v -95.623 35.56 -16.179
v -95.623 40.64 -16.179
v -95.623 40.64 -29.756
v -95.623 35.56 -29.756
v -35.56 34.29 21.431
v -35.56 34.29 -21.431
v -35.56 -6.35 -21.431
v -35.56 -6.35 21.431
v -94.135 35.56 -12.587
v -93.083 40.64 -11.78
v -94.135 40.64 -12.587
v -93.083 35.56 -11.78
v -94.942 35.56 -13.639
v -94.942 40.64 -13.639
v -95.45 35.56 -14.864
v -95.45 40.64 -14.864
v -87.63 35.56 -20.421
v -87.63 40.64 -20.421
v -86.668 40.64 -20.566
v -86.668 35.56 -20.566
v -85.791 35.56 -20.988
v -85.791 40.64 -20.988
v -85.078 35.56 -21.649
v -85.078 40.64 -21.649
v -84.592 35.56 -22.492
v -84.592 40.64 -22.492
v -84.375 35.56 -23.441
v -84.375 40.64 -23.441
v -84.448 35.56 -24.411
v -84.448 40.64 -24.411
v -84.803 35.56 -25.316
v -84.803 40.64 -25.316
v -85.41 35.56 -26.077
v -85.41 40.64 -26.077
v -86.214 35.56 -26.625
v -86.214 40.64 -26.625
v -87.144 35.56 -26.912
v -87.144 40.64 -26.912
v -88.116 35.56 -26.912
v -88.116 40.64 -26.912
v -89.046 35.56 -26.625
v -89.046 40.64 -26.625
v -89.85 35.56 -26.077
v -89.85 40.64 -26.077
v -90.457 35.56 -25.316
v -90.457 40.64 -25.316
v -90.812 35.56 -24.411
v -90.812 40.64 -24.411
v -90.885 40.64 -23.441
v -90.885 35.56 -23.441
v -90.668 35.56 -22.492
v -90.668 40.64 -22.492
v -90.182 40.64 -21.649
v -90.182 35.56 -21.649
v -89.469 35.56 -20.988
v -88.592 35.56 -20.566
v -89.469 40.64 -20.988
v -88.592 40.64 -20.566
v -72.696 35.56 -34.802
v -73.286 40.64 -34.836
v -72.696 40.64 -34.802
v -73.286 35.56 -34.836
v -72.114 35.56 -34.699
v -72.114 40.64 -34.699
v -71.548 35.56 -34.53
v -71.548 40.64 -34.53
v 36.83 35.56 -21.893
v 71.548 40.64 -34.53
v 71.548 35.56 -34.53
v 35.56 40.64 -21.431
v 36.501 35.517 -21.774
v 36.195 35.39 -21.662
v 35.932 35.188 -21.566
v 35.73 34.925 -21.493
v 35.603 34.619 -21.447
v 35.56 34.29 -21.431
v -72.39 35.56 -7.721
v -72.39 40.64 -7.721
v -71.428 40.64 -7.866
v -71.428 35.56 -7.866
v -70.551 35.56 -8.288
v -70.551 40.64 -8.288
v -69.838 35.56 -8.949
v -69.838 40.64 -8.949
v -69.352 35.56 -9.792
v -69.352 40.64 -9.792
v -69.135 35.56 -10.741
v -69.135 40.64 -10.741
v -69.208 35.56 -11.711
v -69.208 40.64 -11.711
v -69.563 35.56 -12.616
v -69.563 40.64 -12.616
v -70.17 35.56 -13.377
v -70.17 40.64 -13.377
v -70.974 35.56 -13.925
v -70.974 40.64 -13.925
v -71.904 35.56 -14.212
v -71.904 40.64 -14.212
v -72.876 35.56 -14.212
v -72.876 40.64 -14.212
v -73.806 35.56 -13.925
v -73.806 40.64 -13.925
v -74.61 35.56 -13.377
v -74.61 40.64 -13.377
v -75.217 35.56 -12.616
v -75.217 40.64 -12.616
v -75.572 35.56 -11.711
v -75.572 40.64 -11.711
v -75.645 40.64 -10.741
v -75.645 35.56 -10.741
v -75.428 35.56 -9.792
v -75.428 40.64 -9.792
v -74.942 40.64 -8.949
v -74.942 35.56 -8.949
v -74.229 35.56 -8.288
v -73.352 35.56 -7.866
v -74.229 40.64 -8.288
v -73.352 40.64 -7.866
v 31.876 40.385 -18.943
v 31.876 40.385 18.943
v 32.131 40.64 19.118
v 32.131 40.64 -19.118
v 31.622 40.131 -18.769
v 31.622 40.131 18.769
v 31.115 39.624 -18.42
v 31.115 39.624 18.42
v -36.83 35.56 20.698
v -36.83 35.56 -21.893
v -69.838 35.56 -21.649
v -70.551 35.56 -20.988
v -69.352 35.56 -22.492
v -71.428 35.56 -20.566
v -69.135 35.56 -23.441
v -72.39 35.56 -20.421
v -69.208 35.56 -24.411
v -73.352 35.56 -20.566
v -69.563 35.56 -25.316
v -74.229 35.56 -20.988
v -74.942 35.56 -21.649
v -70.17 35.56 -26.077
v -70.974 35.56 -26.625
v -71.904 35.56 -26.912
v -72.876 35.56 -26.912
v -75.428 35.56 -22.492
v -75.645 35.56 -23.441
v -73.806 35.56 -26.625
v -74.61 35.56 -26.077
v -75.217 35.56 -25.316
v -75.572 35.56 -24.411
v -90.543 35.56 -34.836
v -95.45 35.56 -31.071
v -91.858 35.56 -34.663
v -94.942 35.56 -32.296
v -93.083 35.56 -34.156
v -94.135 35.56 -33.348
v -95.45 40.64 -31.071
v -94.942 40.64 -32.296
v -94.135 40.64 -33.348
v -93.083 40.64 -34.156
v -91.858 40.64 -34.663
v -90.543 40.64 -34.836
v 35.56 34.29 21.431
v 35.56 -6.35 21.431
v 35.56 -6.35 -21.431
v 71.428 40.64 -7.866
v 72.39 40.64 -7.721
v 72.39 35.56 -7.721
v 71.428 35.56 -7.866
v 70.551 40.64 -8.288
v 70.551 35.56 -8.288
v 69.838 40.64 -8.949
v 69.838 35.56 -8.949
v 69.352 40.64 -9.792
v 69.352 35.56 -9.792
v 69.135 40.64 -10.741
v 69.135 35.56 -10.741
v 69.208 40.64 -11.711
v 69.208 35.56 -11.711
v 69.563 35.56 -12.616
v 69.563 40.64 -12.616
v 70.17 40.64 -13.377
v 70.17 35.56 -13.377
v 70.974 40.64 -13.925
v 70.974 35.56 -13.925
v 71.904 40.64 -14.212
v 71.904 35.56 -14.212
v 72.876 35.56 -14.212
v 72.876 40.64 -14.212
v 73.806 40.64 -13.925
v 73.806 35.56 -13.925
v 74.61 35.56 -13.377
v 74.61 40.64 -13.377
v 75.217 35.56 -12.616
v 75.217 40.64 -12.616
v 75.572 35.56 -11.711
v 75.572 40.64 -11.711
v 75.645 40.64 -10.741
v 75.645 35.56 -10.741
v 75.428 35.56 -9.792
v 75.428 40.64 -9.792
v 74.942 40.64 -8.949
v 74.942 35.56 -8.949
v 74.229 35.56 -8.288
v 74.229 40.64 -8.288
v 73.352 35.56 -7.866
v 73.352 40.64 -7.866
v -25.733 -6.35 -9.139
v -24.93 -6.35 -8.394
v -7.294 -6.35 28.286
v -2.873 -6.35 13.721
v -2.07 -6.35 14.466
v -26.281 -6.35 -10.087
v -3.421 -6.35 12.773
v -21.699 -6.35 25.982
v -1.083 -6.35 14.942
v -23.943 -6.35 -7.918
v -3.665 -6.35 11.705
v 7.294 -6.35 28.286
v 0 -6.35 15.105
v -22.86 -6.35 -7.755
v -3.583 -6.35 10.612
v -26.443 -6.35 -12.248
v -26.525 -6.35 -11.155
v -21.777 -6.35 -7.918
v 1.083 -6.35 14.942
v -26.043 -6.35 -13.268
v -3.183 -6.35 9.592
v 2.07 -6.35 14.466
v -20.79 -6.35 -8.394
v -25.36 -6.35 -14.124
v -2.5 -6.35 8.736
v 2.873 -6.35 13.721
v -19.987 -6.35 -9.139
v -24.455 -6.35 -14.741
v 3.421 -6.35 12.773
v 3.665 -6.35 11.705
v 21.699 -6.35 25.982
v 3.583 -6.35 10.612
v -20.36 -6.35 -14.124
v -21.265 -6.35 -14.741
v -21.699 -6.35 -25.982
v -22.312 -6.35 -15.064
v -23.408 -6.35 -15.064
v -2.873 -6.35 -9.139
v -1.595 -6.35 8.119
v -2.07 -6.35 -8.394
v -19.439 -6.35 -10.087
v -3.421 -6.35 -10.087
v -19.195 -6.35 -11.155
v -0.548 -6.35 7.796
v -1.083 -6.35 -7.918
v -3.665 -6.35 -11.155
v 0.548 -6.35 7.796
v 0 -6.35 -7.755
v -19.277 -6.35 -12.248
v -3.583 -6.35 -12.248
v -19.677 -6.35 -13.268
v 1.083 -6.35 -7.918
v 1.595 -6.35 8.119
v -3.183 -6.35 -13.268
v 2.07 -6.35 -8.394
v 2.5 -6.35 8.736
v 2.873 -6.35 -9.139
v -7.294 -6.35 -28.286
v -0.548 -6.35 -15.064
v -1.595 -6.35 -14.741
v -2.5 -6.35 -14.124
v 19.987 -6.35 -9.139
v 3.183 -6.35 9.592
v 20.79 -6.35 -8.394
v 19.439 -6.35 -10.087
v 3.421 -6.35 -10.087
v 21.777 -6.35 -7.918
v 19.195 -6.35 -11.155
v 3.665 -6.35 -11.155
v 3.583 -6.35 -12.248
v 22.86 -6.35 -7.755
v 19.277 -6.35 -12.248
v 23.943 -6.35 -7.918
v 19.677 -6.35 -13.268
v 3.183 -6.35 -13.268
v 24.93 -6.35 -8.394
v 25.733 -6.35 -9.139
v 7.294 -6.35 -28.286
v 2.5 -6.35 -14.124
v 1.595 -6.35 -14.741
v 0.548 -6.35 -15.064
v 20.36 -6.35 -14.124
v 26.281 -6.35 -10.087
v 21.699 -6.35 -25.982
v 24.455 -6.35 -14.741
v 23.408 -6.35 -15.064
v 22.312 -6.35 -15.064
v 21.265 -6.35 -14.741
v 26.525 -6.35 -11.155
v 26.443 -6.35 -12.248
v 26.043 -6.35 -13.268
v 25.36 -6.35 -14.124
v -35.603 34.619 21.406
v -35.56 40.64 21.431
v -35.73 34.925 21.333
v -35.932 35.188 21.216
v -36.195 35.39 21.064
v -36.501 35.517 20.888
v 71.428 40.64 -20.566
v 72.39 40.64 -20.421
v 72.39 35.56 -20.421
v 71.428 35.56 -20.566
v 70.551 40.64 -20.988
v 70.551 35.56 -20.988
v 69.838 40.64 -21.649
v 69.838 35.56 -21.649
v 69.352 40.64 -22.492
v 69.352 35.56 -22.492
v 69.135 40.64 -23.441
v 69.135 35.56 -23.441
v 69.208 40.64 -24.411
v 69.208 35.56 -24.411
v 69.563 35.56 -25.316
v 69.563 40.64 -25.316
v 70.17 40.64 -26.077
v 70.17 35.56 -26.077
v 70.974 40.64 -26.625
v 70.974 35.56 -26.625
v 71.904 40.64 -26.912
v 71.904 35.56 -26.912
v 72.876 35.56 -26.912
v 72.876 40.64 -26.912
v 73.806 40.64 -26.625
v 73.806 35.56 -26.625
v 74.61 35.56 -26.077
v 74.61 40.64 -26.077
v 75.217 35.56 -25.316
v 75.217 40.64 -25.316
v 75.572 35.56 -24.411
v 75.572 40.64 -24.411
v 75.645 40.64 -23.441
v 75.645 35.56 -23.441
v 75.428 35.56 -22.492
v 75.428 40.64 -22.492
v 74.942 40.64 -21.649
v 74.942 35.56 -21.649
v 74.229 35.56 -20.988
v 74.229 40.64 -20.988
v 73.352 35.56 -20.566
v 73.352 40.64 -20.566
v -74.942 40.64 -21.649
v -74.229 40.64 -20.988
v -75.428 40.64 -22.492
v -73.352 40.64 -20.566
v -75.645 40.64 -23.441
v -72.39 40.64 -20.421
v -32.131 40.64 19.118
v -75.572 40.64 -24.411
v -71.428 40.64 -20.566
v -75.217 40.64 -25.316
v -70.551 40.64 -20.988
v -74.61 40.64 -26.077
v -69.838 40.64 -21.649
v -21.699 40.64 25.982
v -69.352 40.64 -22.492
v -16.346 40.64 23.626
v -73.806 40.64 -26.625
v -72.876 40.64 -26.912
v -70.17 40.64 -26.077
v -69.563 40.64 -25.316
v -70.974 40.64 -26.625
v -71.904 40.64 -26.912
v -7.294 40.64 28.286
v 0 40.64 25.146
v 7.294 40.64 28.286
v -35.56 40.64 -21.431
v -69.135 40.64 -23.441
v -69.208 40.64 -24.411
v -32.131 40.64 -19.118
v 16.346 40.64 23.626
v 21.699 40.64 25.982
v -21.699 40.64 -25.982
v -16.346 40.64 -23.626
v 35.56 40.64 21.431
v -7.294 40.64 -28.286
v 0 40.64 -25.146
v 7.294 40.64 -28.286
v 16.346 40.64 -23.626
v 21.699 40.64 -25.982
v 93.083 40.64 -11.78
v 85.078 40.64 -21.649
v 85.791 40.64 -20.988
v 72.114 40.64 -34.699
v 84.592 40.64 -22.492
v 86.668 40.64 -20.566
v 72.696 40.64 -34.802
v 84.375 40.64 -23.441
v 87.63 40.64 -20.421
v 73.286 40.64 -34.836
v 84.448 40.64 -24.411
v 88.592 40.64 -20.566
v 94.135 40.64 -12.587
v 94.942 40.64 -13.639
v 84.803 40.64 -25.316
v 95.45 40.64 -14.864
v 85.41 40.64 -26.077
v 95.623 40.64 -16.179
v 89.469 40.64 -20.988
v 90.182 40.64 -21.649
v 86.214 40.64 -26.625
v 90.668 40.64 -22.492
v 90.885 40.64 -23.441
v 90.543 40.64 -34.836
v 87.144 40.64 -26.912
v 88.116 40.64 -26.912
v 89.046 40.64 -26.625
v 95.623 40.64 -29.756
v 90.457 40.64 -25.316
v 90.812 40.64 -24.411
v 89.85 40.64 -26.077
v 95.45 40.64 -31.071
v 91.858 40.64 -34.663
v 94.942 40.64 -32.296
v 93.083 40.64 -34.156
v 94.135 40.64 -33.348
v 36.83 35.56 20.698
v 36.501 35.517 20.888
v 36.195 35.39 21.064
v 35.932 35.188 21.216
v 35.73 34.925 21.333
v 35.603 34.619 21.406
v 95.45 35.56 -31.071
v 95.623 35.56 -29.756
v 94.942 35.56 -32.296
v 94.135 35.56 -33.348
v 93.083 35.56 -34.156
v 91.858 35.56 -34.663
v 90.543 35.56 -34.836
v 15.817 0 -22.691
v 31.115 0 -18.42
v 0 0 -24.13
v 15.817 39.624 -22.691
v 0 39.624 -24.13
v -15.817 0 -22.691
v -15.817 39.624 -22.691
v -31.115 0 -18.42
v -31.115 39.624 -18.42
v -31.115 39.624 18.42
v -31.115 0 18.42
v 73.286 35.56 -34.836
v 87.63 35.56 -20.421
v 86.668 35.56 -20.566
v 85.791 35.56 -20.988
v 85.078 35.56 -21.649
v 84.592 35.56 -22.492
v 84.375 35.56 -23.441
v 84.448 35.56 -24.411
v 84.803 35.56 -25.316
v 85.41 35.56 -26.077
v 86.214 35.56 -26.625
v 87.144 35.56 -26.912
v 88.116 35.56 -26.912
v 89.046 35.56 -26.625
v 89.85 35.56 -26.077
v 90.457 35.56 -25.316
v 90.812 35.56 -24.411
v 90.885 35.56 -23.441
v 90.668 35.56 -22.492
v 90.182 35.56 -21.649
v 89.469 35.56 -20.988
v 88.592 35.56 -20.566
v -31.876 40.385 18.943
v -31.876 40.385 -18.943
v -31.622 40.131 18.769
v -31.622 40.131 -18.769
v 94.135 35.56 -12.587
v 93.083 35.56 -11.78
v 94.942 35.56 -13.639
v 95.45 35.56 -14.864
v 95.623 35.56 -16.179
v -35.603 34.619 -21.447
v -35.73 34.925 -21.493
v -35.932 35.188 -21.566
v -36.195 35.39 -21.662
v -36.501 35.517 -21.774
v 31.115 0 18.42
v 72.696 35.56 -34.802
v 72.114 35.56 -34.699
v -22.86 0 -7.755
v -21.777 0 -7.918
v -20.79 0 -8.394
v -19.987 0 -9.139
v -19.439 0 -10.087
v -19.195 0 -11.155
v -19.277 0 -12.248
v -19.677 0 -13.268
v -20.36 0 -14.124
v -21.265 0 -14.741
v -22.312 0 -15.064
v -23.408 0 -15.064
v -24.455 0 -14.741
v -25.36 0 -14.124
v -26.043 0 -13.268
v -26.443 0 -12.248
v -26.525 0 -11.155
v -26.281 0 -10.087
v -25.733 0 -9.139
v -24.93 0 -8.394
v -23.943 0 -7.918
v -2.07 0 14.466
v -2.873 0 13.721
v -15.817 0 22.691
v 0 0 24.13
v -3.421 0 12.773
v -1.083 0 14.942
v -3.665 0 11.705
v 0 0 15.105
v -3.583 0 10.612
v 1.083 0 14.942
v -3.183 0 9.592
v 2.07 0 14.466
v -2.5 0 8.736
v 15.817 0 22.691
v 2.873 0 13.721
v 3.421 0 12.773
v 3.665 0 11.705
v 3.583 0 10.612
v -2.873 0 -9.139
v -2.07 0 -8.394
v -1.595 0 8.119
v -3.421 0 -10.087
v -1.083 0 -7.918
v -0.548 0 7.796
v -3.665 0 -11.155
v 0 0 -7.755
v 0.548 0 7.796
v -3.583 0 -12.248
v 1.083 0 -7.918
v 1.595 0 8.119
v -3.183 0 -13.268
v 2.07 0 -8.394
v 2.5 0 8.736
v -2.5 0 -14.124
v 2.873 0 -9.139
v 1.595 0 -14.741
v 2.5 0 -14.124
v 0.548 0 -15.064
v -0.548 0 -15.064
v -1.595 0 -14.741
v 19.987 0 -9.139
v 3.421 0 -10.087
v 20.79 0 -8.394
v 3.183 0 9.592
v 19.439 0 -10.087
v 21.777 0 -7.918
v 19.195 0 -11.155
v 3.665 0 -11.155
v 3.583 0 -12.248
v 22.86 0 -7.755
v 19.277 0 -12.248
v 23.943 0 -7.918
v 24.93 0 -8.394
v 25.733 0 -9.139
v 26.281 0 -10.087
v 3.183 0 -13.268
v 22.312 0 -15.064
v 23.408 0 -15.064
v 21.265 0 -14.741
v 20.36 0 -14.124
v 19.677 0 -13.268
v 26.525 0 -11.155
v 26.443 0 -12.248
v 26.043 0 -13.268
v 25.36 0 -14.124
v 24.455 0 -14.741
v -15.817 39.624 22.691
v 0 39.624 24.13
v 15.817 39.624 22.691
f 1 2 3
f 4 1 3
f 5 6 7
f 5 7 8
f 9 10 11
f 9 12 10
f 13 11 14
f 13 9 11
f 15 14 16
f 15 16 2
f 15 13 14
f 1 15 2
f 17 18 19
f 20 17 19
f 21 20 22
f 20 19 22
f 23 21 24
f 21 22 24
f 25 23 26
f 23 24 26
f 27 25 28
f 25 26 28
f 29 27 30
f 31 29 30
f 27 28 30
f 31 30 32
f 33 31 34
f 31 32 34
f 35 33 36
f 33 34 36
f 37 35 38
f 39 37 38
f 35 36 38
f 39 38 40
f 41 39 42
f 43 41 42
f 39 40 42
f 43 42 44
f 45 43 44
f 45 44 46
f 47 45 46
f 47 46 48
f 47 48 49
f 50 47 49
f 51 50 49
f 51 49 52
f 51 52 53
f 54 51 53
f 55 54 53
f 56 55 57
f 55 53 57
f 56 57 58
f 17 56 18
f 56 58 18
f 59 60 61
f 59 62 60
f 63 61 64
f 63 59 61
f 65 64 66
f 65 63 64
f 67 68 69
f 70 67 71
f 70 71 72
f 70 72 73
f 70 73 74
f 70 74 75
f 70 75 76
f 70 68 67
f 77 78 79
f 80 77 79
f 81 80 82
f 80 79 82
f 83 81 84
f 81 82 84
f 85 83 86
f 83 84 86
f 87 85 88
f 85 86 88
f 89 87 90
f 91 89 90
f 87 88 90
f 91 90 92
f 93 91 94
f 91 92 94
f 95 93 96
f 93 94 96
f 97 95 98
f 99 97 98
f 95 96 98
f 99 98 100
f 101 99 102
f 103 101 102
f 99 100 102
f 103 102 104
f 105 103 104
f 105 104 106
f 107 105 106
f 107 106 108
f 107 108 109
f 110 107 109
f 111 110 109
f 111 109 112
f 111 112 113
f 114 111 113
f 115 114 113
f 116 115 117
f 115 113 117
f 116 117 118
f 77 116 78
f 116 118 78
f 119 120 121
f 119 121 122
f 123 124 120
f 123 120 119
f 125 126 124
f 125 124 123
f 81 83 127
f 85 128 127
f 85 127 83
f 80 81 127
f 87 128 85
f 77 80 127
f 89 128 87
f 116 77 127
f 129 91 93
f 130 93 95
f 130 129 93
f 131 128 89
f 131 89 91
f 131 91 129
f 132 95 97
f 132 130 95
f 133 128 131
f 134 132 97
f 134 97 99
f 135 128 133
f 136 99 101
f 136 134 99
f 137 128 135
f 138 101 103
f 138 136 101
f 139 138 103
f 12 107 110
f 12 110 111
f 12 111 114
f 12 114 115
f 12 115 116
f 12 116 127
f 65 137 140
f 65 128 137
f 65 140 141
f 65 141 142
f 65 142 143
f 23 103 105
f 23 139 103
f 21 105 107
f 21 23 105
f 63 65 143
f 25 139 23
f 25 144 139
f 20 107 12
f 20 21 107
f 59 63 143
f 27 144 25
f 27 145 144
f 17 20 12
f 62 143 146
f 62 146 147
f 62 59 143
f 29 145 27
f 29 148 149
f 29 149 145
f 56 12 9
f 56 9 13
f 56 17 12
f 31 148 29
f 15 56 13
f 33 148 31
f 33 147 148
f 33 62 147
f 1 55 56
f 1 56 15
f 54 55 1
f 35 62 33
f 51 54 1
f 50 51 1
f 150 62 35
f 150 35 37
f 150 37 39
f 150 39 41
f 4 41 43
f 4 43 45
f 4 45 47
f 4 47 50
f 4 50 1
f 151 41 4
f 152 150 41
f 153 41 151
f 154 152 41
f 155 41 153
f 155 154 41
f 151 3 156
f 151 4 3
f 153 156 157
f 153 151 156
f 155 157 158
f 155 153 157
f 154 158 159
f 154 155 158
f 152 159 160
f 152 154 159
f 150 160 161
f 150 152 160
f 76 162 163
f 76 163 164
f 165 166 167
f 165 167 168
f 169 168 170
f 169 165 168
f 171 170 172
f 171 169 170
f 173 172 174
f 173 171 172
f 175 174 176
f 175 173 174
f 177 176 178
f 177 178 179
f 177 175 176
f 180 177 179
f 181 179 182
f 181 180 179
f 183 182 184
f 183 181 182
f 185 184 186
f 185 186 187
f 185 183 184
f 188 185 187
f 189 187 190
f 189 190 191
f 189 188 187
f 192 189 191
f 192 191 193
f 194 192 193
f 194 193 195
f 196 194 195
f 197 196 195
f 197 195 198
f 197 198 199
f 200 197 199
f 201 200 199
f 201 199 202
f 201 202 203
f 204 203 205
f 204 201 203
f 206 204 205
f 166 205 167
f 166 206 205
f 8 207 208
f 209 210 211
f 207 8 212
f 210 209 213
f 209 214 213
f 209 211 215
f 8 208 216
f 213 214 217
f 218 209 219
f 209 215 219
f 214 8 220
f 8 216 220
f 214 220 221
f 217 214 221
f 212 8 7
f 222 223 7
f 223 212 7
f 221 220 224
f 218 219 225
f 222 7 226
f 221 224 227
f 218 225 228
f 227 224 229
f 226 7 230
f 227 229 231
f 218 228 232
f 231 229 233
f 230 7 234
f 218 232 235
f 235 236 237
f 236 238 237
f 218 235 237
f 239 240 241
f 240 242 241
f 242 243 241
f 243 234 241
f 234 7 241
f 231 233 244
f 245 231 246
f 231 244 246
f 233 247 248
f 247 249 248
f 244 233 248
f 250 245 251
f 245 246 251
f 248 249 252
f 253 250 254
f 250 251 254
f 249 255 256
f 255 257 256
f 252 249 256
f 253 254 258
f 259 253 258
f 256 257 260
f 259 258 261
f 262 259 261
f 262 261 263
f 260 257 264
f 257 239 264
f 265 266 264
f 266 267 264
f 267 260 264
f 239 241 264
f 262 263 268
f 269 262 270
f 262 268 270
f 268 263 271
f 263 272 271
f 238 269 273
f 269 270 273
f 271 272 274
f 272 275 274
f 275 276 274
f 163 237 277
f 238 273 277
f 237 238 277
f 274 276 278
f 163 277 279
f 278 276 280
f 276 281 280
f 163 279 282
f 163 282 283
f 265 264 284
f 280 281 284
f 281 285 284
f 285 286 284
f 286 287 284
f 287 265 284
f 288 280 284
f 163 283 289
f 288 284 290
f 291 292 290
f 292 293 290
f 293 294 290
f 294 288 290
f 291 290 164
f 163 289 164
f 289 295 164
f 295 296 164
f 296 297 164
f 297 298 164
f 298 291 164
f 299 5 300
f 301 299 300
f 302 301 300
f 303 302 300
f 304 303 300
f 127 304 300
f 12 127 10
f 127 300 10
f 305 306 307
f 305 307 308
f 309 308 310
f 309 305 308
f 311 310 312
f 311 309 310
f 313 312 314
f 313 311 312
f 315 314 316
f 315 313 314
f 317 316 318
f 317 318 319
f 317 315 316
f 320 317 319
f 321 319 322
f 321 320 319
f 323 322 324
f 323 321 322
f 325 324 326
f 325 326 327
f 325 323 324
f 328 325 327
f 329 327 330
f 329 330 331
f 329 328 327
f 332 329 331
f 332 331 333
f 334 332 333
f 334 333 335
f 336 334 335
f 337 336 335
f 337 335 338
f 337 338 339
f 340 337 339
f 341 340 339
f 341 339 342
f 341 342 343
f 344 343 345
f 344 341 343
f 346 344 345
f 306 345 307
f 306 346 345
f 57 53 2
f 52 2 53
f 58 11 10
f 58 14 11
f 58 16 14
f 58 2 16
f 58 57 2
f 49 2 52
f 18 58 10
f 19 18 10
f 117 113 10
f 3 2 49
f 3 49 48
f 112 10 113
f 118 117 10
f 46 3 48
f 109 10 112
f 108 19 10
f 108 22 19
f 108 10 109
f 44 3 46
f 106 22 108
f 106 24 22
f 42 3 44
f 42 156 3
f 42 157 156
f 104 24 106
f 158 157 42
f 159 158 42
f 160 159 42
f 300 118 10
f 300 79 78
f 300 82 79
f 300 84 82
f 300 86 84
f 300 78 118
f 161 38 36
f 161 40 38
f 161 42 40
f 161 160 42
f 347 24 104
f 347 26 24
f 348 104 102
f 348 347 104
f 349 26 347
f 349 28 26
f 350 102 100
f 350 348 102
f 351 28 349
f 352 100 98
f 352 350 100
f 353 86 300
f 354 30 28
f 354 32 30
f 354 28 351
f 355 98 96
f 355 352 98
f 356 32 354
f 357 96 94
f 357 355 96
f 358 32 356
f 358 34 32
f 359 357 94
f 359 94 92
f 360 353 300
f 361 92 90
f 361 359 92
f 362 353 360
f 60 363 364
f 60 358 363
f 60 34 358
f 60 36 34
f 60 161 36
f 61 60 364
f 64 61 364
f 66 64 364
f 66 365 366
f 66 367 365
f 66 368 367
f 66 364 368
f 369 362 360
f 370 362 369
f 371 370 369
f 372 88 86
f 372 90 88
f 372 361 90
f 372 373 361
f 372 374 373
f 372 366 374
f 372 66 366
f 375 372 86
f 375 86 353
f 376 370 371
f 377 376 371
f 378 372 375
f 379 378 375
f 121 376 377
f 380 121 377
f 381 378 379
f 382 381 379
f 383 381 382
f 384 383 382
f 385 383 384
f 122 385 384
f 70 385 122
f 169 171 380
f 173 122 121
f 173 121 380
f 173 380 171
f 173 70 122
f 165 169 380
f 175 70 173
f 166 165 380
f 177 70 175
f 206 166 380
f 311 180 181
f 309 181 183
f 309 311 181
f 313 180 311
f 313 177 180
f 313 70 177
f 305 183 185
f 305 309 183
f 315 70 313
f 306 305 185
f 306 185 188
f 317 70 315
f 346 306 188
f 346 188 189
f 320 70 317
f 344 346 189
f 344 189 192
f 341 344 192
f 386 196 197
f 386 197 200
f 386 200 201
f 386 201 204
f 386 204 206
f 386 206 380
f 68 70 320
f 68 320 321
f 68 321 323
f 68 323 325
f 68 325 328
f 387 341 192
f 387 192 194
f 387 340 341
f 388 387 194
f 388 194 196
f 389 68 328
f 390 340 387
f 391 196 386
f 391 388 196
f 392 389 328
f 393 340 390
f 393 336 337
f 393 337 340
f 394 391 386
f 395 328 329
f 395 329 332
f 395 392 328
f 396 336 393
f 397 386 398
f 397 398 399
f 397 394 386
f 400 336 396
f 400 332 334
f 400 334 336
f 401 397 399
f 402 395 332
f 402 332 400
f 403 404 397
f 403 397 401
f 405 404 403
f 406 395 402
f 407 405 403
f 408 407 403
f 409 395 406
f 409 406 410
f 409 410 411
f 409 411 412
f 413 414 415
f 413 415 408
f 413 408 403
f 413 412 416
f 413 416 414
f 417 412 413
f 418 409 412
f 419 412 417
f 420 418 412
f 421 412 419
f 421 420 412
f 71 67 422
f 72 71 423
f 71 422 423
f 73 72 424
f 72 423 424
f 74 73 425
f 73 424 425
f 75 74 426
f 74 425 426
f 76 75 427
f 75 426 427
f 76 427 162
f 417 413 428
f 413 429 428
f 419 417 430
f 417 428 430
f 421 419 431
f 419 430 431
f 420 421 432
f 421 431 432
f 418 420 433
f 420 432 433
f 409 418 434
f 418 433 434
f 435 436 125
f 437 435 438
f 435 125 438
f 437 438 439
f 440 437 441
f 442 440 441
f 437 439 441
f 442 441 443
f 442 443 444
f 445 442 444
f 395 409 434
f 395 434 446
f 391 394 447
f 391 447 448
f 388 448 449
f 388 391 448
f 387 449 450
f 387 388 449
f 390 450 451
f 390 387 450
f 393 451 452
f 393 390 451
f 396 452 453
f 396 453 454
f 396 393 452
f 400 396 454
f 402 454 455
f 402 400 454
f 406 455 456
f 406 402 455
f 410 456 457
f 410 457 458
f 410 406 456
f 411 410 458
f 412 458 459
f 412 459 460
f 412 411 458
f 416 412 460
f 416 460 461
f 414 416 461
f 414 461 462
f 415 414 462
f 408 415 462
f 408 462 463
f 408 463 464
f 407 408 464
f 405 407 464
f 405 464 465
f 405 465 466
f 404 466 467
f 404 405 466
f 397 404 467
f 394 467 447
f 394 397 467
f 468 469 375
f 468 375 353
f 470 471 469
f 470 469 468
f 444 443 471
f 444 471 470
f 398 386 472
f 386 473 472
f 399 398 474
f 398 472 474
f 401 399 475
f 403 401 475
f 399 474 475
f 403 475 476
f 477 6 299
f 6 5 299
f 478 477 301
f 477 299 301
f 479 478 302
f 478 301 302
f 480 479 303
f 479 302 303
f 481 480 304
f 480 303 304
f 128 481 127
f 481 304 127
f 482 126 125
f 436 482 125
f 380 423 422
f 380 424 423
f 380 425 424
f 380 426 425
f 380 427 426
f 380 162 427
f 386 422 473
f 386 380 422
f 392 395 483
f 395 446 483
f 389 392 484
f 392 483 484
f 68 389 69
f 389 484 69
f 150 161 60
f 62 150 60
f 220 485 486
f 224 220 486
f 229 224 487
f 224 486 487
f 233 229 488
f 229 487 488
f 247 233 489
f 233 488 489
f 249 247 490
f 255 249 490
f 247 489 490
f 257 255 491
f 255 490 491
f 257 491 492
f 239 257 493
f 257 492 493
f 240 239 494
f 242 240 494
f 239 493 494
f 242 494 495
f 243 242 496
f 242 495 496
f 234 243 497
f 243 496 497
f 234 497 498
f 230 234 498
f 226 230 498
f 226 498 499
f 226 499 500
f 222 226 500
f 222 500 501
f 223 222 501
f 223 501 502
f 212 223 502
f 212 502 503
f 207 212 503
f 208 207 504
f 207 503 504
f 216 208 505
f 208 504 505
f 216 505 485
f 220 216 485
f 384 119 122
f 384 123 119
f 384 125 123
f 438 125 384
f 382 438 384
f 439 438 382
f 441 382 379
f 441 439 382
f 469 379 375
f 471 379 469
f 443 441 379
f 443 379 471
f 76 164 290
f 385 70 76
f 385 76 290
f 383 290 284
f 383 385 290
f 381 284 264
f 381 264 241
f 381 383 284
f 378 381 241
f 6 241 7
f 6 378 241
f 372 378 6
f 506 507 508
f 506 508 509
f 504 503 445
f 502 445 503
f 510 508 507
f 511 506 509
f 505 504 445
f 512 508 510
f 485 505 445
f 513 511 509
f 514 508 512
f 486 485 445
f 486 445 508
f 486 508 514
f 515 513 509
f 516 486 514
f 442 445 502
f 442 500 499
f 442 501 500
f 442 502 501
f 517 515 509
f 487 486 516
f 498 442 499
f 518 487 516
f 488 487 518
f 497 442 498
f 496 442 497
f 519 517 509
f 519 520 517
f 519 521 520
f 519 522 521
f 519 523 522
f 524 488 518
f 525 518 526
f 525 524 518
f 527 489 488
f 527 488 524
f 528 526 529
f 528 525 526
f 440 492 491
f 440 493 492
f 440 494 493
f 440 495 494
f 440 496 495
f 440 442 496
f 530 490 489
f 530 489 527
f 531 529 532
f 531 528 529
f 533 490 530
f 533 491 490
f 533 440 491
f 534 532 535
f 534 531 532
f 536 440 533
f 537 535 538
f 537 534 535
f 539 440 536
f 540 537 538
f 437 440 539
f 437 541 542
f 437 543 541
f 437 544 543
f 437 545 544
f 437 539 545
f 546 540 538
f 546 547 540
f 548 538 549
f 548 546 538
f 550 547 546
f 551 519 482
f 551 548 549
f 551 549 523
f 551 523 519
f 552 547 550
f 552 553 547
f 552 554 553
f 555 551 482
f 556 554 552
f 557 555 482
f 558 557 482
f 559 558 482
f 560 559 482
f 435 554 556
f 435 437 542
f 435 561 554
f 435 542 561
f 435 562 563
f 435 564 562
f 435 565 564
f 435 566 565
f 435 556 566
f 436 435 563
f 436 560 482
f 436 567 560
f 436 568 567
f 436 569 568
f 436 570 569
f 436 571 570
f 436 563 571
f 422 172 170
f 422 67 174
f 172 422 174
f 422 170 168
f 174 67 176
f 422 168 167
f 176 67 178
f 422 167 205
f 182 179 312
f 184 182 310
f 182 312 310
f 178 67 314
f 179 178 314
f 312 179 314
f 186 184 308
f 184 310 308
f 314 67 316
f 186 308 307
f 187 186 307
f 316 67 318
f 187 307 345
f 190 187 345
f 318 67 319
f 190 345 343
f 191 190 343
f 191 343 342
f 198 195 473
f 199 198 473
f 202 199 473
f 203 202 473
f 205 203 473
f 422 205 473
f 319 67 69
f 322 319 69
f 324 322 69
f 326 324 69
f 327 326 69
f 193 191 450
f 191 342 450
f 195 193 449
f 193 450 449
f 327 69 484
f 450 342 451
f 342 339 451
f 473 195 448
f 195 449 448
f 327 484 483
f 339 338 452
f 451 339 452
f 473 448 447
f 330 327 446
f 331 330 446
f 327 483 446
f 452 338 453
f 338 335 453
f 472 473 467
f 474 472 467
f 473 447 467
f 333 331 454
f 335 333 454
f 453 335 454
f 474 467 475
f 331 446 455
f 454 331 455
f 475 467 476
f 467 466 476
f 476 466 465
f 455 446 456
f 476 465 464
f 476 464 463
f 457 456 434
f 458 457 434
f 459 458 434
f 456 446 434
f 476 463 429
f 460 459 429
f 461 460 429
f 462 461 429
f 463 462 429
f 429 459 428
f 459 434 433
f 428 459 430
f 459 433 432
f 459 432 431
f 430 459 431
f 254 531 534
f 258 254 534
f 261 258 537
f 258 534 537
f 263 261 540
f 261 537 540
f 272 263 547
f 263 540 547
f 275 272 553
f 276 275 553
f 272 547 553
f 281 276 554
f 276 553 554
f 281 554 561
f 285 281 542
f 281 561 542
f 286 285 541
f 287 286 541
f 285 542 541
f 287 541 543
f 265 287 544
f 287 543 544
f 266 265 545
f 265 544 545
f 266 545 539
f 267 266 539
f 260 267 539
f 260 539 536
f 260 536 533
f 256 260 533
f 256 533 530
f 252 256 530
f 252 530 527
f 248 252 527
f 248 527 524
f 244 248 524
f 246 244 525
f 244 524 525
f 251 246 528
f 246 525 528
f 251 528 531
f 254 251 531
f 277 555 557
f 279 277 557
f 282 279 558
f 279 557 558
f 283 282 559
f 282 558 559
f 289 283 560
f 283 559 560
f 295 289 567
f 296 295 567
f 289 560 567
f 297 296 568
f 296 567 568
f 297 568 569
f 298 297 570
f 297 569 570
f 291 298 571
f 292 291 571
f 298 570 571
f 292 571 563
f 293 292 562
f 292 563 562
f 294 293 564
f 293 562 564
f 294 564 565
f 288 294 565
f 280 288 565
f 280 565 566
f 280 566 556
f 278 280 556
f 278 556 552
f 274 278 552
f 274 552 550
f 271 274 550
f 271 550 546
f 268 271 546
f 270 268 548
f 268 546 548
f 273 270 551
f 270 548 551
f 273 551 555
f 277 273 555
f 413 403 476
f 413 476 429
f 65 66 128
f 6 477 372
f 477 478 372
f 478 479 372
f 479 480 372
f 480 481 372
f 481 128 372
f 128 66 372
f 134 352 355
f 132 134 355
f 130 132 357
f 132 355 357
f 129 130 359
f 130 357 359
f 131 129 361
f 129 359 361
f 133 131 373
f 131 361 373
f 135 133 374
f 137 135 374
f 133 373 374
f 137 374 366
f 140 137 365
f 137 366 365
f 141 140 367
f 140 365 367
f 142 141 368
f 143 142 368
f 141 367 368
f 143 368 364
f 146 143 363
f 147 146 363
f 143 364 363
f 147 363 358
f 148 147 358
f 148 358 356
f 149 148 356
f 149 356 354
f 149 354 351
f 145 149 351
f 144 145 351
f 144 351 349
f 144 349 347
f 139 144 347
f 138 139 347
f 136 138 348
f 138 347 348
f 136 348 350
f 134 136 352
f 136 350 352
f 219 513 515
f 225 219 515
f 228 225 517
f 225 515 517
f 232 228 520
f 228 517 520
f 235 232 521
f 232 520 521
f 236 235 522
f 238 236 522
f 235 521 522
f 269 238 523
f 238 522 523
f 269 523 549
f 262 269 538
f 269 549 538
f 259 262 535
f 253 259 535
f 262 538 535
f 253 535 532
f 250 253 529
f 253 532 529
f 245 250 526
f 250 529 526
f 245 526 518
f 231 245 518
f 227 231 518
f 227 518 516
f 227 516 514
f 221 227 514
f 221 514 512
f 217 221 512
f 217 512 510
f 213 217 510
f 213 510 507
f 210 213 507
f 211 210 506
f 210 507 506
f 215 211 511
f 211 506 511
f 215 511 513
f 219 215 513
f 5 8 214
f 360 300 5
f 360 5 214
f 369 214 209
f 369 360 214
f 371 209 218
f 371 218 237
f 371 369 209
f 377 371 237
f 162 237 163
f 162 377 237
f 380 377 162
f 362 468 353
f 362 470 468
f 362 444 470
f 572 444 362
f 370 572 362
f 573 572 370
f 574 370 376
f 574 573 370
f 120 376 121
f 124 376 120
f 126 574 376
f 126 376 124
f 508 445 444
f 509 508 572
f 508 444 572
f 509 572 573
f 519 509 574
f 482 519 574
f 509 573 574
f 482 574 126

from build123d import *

# Parameters (mm, degrees)
SKETCH1_R            = 3.675
BOSS_EXTRUDE1_DEPTH  = 6.35
BOSS_EXTRUDE2_START  = 40.64
BOSS_EXTRUDE2_DEPTH  = 40.64
CHAMFER1_SIZE        = 1.016
SKETCH3_R            = 3.2639
BOSS_EXTRUDE3_DEPTH  = 5.08
FILLET1_R            = 5.08
FILLET1_OF_MIRROR1_R = 5.08
FILLET2_R            = 1.27


with BuildPart() as part:
    # Sketch1 → Boss-Extrude1 (new body)
    with BuildSketch(Plane(origin=(0, 0, 0), x_dir=(1, 0, 0), z_dir=(0, 1, 0))):
        with BuildLine():
            Line((-35.56, 21.431101635), (-35.56, -21.431101635))
            ThreePointArc((-35.56, -21.431101635), (0, -28.575), (35.56, -21.431101635))
            Line((35.56, -21.431101635), (35.56, 21.431101635))
            ThreePointArc((35.56, 21.431101635), (0, 28.575), (-35.56, 21.431101635))
        make_face()
        with Locations(Location((-22.86, 11.43, 0), (0, 0, 270))):
            Circle(SKETCH1_R, mode=Mode.SUBTRACT)
        with Locations(Location((0, 11.43, 0), (0, 0, 270))):
            Circle(SKETCH1_R, mode=Mode.SUBTRACT)
        with Locations(Location((22.86, 11.43, 0), (0, 0, 270))):
            Circle(SKETCH1_R, mode=Mode.SUBTRACT)
        with Locations(Location((0, -11.43, 0), (0, 0, 270))):
            Circle(SKETCH1_R, mode=Mode.SUBTRACT)
    extrude(amount=-BOSS_EXTRUDE1_DEPTH)

    # Sketch2 → Boss-Extrude2 (add)
    with BuildSketch(Plane(origin=(0, 0, 0), x_dir=(1, 0, 0), z_dir=(0, 1, 0)).offset(BOSS_EXTRUDE2_START)):
        with BuildLine():
            Line((-35.56, 21.431101635), (-35.56, -21.431101635))
            ThreePointArc((-35.56, -21.431101635), (0, -28.575), (35.56, -21.431101635))
            Line((35.56, -21.431101635), (35.56, 21.431101635))
            ThreePointArc((35.56, 21.431101635), (0, 28.575), (-35.56, 21.431101635))
        make_face()
        with BuildLine():
            Line((-31.115, 18.419922333), (-31.115, -18.419922333))
            ThreePointArc((-31.115, -18.419922333), (0, -24.13), (31.115, -18.419922333))
            Line((31.115, -18.419922333), (31.115, 18.419922333))
            ThreePointArc((31.115, 18.419922333), (0, 24.13), (-31.115, 18.419922333))
        make_face(mode=Mode.SUBTRACT)
    extrude(amount=-BOSS_EXTRUDE2_DEPTH)

    # Chamfer1
    chamfer1_edges = [part.edges().sort_by_distance(p)[0] for p in [
        (0, 40.64, -24.13),
        (-31.115, 40.64, 0),
        (0, 40.64, 24.13),
        (31.115, 40.64, 0),
    ]]
    chamfer(chamfer1_edges, length=CHAMFER1_SIZE)

    # Sketch3 → Boss-Extrude3 (add)
    with BuildSketch(Plane(origin=(0, 40.64, 0), x_dir=(1, 0, 0), z_dir=(0, 1, 0))):
        Polygon((-35.56, -21.431101635), (-95.622719028, 13.246125363), (-95.622719028, 34.836125363), (-72.39, 34.836125363), (-35.56, 21.431101635), align=None)
        with Locations(Location((-87.63, 23.684417071, 0), (0, 0, 270))):
            Circle(SKETCH3_R, mode=Mode.SUBTRACT)
        with Locations(Location((-72.39, 23.684417071, 0), (0, 0, 270))):
            Circle(SKETCH3_R, mode=Mode.SUBTRACT)
        with Locations(Location((-72.39, 10.984417071, 0), (0, 0, 270))):
            Circle(SKETCH3_R, mode=Mode.SUBTRACT)
    boss_extrude3 = extrude(amount=-BOSS_EXTRUDE3_DEPTH)

    # Fillet1
    fillet1_edges = [part.edges().sort_by_distance(p)[0] for p in [
        (-95.622719028, 38.1, -13.246125363),
        (-95.622719028, 38.1, -34.836125363),
        (-72.39, 38.1, -34.836125363),
    ]]
    fillet(fillet1_edges, radius=FILLET1_R)

    # Mirror1: Boss-Extrude3 across plane
    add(boss_extrude3.mirror(Plane(origin=(0, 0, 0), x_dir=(0, 0, 1), z_dir=(1, 0, 0))))

    # Fillet1 of Mirror1
    fillet1_of_mirror1_edges = [part.edges().sort_by_distance(p)[0] for p in [
        (95.622719028, 38.1, -13.246125363),
        (95.622719028, 38.1, -34.836125363),
        (72.39, 38.1, -34.836125363),
    ]]
    fillet(fillet1_of_mirror1_edges, radius=FILLET1_OF_MIRROR1_R)

    # Fillet2
    fillet2_edges = [part.edges().sort_by_distance(p)[0] for p in [
        (35.56, 35.56, 0),
        (-35.56, 35.56, 0),
    ]]
    fillet(fillet2_edges, radius=FILLET2_R)


solid = part.part
